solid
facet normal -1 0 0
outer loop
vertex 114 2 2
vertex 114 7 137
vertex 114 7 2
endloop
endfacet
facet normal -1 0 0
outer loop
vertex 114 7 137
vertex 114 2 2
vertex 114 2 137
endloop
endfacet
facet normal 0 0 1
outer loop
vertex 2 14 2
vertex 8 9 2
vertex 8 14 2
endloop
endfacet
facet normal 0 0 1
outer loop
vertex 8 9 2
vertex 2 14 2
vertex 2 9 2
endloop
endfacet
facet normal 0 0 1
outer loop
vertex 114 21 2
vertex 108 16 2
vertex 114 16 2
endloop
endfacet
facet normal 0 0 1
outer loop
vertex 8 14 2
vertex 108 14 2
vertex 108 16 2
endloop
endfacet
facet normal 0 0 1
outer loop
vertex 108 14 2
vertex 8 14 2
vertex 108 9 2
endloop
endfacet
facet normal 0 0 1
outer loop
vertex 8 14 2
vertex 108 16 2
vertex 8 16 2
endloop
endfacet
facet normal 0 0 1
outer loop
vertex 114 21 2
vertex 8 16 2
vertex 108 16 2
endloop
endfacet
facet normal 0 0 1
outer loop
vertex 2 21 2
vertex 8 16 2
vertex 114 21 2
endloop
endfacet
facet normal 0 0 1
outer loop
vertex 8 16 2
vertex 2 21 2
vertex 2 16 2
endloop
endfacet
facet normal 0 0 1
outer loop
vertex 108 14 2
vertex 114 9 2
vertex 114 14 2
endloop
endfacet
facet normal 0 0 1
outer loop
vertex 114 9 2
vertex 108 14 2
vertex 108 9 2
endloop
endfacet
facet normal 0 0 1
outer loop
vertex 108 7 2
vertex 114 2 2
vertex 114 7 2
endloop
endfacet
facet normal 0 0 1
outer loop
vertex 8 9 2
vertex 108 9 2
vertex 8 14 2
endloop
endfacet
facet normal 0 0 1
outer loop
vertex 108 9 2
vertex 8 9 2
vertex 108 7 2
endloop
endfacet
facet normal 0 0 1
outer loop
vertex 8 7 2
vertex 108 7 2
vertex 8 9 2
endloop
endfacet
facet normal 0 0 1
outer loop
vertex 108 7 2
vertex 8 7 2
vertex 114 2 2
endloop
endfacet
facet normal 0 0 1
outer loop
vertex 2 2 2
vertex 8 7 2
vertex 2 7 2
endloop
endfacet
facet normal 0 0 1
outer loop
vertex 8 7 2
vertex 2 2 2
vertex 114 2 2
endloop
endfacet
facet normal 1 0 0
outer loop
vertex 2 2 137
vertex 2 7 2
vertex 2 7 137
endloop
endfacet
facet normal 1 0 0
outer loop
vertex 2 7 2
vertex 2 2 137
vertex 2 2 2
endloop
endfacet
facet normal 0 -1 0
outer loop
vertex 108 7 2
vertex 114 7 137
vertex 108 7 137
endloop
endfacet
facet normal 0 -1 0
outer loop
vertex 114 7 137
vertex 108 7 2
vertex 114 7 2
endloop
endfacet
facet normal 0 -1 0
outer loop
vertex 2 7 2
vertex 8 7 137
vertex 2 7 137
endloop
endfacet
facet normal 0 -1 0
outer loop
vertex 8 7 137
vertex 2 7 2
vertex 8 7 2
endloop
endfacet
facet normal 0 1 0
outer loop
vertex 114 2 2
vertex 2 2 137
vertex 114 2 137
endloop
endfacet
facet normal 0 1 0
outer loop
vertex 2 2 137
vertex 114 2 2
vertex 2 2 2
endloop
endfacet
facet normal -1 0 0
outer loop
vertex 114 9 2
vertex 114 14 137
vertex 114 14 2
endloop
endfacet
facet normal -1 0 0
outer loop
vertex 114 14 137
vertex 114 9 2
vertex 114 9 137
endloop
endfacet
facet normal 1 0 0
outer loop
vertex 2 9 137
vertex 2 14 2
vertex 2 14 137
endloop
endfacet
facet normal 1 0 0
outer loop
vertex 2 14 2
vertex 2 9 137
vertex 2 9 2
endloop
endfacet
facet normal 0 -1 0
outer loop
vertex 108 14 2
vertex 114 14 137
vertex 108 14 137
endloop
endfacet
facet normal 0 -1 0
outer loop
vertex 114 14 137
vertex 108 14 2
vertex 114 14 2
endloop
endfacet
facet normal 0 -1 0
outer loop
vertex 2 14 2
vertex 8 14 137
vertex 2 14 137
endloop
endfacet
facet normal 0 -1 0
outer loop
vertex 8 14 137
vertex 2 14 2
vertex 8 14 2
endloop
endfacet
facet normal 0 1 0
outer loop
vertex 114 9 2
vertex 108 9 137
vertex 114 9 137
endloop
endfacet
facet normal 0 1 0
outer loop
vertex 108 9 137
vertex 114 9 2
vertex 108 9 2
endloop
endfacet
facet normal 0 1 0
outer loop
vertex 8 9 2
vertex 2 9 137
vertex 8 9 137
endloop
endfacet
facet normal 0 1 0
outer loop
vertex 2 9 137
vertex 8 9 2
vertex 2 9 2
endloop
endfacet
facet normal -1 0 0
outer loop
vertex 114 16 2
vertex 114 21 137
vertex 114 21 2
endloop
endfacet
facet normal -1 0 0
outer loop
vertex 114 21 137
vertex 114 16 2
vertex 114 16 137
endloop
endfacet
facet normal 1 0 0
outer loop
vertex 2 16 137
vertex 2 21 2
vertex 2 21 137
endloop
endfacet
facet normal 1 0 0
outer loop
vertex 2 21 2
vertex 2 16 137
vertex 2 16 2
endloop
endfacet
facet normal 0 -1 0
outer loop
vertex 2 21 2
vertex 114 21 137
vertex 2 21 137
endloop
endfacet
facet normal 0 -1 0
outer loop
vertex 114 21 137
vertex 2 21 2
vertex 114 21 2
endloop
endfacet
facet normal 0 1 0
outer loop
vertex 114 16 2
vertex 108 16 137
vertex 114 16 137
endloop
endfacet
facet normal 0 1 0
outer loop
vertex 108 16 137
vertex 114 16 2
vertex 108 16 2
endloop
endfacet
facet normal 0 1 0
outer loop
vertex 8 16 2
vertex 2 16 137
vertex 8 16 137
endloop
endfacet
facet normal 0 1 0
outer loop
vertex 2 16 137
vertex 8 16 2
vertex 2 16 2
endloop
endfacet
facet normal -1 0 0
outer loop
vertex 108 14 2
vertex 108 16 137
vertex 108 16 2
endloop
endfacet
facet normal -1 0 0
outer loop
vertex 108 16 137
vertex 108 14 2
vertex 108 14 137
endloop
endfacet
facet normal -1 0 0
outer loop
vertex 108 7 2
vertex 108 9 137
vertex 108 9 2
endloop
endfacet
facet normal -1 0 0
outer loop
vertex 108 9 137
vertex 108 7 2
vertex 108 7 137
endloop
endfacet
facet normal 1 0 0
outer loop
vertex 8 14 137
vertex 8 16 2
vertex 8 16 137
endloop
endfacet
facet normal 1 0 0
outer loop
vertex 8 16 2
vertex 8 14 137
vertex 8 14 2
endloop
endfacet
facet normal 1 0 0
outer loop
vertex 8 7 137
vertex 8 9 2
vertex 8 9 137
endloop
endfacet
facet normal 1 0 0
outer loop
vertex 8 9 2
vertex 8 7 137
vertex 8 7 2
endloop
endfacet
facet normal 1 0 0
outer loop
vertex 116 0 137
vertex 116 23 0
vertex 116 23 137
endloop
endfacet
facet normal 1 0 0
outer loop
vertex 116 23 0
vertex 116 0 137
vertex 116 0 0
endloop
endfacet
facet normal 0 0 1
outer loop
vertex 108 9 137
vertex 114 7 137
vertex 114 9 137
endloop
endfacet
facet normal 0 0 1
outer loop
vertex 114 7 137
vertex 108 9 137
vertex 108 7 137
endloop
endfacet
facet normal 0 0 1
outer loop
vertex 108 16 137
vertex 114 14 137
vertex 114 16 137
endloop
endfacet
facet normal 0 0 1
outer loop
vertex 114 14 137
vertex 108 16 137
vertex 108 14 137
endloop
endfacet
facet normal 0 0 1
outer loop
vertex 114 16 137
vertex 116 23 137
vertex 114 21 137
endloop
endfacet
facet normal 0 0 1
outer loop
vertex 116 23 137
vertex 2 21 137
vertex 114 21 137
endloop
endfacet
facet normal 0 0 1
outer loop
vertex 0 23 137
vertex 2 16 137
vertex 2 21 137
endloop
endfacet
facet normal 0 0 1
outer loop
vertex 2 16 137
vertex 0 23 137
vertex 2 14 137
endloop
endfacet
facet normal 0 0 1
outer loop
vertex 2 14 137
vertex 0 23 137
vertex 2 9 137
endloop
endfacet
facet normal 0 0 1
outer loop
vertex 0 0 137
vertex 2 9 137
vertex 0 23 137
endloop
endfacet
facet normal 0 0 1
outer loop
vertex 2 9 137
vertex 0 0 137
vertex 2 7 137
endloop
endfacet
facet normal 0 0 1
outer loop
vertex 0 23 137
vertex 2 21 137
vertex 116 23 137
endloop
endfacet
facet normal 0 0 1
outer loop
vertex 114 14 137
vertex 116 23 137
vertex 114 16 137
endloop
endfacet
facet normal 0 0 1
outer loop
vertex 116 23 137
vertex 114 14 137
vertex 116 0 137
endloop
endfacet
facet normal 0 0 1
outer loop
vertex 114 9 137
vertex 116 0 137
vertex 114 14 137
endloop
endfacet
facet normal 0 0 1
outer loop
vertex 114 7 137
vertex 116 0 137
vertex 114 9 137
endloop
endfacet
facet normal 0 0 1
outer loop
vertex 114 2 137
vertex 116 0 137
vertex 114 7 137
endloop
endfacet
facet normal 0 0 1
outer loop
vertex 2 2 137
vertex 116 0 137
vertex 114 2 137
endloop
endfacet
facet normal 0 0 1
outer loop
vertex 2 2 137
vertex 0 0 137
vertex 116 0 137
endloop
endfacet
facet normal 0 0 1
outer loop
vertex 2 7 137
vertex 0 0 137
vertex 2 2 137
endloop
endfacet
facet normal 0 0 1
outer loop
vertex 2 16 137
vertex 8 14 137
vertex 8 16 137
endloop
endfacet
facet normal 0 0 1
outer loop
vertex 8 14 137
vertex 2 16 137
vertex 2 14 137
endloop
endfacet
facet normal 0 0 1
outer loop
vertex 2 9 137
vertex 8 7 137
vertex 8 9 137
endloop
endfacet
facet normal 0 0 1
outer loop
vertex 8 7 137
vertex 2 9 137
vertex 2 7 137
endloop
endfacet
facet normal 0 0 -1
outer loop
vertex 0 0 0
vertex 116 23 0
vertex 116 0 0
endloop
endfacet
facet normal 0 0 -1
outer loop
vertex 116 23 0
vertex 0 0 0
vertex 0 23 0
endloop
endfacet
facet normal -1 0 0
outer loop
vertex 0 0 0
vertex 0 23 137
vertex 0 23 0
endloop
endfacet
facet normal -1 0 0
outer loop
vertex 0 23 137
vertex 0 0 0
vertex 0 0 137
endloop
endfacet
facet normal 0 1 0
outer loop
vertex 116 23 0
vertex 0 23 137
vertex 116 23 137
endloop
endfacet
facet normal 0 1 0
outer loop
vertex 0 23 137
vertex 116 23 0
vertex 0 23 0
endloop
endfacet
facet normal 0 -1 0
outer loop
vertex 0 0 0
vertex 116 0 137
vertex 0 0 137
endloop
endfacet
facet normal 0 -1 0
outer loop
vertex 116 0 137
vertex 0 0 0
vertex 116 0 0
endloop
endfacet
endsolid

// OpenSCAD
//rotate([90,0,0])
//translate([-74,-61,-4])
//import("./color_card_board_n1_10_gap15.stl");

function display_board_width() = 108;
function display_board_height() = 135;
function display_board_depth() = 3;
board_gap = 2;

hold_count = 3;

module swatch_hole() {
    cube([
        display_board_width() + board_gap * 2,
        display_board_depth() + board_gap,
        display_board_height() + board_gap
    ]);
}

module swatch_container_slab() {
    cube([
        display_board_width() + board_gap * 4,
        board_gap + (display_board_depth() + board_gap * 2) * hold_count,
        display_board_height() + board_gap
    ]);
}

module swatch_container_slots() {
    union() {
        translate([board_gap * 4, board_gap, board_gap])
        cube([
            display_board_width() - board_gap * 4,
            (display_board_depth() + board_gap * 2) * hold_count - board_gap,
            display_board_height() + board_gap
        ]);
        
        for (i = [0:hold_count-1]) {
        echo((display_board_depth() + board_gap * 2) * i + board_gap);
            translate([
                board_gap,
                (display_board_depth() + board_gap * 2) * i + board_gap,
                board_gap
            ])
            swatch_hole();
        }
    }
}

difference() {
    swatch_container_slab();
    swatch_container_slots();
}
